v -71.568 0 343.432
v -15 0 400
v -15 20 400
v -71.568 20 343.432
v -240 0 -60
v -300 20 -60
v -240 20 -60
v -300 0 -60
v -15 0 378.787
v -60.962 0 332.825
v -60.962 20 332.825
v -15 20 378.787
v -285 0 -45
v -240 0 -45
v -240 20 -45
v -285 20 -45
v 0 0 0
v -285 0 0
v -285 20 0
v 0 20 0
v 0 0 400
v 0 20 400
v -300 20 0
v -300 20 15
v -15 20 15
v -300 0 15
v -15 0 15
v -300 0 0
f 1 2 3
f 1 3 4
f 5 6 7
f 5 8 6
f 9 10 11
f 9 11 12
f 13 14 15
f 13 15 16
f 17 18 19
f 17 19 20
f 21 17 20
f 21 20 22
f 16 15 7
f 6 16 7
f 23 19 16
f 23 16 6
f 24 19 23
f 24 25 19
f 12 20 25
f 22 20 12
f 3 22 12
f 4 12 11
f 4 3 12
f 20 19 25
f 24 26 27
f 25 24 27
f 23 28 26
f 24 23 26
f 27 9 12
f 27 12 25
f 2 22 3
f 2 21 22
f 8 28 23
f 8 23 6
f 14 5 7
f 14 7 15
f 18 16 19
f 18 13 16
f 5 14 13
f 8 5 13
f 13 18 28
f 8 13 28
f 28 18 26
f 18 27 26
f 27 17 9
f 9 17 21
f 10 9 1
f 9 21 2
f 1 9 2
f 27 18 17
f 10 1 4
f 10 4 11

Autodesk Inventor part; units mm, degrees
ref_plane "YZ Plane" through (0, 0, 0) normal (1, 0, 0) x (0, 1, 0)
ref_plane "XZ Plane" through (0, 0, 0) normal (0, 1, 0) x (-1, 0, 0)
ref_plane "XY Plane" through (0, 0, 0) normal (0, 0, 1) x (1, 0, 0)
sketch "Schizzo1" plane through (0, 0, 0) normal (0, 1, 0) x (-1, 0, 0)
  line L0 (300, 0) -> (300, 15)
  line L1 (0, 0) -> (0, 400)
  line L2 (0, 400) -> (15, 400)
  line L3 (15, 400) -> (71.5685, 343.4315)
  line L4 (15, 400) -> (95, 400) construction
  line L5 (71.5685, 343.4315) -> (60.9619, 332.8249)
  line L6 (60.9619, 332.8249) -> (15, 378.7868)
  line L7 (15, 378.7868) -> (15, 15)
  line L8 (300, 15) -> (15, 15)
  line L9 (300, 0) -> (300, -60)
  line L10 (300, -60) -> (240, -60)
  line L11 (240, -60) -> (240, -45)
  line L12 (240, -45) -> (285, -45)
  line L13 (285, -45) -> (285, 0)
  line L14 (285, 0) -> (0, 0)
  dimension "d1" = 15
  dimension "d3" = 400
  dimension "d4" = 15
  dimension "d5" = 80
  dimension "d6" = 45
  dimension "d7" = 15
  dimension "d8" = 60
  dimension "d9" = 60
  dimension "d10" = 15
  dimension "d11" = 45
extrude "Estrusione1" add sketch "Schizzo1" along normal blind 20
equation "\"RaggioPiega\" = Spessore"
equation "\"LarghezzaScaricoPiega\" = Spessore"
equation "\"ProfonditàScaricoPiega\" = 0.5 * Spessore"
equation "\"DimensioniScaricoAngolo\" = 4 * Spessore"
equation "\"ResiduoMinimo\" = 2 * Spessore"
equation "\"RaggioTransizione\" = RaggioPiega"
equation "\"Dimensione_raggio_Jacobi\" = RaggioPiega"
equation "\"DimensioneGioco\" = Spessore"
equation "\"Spessore\" = 0.5"
properties part number "Staffa"
